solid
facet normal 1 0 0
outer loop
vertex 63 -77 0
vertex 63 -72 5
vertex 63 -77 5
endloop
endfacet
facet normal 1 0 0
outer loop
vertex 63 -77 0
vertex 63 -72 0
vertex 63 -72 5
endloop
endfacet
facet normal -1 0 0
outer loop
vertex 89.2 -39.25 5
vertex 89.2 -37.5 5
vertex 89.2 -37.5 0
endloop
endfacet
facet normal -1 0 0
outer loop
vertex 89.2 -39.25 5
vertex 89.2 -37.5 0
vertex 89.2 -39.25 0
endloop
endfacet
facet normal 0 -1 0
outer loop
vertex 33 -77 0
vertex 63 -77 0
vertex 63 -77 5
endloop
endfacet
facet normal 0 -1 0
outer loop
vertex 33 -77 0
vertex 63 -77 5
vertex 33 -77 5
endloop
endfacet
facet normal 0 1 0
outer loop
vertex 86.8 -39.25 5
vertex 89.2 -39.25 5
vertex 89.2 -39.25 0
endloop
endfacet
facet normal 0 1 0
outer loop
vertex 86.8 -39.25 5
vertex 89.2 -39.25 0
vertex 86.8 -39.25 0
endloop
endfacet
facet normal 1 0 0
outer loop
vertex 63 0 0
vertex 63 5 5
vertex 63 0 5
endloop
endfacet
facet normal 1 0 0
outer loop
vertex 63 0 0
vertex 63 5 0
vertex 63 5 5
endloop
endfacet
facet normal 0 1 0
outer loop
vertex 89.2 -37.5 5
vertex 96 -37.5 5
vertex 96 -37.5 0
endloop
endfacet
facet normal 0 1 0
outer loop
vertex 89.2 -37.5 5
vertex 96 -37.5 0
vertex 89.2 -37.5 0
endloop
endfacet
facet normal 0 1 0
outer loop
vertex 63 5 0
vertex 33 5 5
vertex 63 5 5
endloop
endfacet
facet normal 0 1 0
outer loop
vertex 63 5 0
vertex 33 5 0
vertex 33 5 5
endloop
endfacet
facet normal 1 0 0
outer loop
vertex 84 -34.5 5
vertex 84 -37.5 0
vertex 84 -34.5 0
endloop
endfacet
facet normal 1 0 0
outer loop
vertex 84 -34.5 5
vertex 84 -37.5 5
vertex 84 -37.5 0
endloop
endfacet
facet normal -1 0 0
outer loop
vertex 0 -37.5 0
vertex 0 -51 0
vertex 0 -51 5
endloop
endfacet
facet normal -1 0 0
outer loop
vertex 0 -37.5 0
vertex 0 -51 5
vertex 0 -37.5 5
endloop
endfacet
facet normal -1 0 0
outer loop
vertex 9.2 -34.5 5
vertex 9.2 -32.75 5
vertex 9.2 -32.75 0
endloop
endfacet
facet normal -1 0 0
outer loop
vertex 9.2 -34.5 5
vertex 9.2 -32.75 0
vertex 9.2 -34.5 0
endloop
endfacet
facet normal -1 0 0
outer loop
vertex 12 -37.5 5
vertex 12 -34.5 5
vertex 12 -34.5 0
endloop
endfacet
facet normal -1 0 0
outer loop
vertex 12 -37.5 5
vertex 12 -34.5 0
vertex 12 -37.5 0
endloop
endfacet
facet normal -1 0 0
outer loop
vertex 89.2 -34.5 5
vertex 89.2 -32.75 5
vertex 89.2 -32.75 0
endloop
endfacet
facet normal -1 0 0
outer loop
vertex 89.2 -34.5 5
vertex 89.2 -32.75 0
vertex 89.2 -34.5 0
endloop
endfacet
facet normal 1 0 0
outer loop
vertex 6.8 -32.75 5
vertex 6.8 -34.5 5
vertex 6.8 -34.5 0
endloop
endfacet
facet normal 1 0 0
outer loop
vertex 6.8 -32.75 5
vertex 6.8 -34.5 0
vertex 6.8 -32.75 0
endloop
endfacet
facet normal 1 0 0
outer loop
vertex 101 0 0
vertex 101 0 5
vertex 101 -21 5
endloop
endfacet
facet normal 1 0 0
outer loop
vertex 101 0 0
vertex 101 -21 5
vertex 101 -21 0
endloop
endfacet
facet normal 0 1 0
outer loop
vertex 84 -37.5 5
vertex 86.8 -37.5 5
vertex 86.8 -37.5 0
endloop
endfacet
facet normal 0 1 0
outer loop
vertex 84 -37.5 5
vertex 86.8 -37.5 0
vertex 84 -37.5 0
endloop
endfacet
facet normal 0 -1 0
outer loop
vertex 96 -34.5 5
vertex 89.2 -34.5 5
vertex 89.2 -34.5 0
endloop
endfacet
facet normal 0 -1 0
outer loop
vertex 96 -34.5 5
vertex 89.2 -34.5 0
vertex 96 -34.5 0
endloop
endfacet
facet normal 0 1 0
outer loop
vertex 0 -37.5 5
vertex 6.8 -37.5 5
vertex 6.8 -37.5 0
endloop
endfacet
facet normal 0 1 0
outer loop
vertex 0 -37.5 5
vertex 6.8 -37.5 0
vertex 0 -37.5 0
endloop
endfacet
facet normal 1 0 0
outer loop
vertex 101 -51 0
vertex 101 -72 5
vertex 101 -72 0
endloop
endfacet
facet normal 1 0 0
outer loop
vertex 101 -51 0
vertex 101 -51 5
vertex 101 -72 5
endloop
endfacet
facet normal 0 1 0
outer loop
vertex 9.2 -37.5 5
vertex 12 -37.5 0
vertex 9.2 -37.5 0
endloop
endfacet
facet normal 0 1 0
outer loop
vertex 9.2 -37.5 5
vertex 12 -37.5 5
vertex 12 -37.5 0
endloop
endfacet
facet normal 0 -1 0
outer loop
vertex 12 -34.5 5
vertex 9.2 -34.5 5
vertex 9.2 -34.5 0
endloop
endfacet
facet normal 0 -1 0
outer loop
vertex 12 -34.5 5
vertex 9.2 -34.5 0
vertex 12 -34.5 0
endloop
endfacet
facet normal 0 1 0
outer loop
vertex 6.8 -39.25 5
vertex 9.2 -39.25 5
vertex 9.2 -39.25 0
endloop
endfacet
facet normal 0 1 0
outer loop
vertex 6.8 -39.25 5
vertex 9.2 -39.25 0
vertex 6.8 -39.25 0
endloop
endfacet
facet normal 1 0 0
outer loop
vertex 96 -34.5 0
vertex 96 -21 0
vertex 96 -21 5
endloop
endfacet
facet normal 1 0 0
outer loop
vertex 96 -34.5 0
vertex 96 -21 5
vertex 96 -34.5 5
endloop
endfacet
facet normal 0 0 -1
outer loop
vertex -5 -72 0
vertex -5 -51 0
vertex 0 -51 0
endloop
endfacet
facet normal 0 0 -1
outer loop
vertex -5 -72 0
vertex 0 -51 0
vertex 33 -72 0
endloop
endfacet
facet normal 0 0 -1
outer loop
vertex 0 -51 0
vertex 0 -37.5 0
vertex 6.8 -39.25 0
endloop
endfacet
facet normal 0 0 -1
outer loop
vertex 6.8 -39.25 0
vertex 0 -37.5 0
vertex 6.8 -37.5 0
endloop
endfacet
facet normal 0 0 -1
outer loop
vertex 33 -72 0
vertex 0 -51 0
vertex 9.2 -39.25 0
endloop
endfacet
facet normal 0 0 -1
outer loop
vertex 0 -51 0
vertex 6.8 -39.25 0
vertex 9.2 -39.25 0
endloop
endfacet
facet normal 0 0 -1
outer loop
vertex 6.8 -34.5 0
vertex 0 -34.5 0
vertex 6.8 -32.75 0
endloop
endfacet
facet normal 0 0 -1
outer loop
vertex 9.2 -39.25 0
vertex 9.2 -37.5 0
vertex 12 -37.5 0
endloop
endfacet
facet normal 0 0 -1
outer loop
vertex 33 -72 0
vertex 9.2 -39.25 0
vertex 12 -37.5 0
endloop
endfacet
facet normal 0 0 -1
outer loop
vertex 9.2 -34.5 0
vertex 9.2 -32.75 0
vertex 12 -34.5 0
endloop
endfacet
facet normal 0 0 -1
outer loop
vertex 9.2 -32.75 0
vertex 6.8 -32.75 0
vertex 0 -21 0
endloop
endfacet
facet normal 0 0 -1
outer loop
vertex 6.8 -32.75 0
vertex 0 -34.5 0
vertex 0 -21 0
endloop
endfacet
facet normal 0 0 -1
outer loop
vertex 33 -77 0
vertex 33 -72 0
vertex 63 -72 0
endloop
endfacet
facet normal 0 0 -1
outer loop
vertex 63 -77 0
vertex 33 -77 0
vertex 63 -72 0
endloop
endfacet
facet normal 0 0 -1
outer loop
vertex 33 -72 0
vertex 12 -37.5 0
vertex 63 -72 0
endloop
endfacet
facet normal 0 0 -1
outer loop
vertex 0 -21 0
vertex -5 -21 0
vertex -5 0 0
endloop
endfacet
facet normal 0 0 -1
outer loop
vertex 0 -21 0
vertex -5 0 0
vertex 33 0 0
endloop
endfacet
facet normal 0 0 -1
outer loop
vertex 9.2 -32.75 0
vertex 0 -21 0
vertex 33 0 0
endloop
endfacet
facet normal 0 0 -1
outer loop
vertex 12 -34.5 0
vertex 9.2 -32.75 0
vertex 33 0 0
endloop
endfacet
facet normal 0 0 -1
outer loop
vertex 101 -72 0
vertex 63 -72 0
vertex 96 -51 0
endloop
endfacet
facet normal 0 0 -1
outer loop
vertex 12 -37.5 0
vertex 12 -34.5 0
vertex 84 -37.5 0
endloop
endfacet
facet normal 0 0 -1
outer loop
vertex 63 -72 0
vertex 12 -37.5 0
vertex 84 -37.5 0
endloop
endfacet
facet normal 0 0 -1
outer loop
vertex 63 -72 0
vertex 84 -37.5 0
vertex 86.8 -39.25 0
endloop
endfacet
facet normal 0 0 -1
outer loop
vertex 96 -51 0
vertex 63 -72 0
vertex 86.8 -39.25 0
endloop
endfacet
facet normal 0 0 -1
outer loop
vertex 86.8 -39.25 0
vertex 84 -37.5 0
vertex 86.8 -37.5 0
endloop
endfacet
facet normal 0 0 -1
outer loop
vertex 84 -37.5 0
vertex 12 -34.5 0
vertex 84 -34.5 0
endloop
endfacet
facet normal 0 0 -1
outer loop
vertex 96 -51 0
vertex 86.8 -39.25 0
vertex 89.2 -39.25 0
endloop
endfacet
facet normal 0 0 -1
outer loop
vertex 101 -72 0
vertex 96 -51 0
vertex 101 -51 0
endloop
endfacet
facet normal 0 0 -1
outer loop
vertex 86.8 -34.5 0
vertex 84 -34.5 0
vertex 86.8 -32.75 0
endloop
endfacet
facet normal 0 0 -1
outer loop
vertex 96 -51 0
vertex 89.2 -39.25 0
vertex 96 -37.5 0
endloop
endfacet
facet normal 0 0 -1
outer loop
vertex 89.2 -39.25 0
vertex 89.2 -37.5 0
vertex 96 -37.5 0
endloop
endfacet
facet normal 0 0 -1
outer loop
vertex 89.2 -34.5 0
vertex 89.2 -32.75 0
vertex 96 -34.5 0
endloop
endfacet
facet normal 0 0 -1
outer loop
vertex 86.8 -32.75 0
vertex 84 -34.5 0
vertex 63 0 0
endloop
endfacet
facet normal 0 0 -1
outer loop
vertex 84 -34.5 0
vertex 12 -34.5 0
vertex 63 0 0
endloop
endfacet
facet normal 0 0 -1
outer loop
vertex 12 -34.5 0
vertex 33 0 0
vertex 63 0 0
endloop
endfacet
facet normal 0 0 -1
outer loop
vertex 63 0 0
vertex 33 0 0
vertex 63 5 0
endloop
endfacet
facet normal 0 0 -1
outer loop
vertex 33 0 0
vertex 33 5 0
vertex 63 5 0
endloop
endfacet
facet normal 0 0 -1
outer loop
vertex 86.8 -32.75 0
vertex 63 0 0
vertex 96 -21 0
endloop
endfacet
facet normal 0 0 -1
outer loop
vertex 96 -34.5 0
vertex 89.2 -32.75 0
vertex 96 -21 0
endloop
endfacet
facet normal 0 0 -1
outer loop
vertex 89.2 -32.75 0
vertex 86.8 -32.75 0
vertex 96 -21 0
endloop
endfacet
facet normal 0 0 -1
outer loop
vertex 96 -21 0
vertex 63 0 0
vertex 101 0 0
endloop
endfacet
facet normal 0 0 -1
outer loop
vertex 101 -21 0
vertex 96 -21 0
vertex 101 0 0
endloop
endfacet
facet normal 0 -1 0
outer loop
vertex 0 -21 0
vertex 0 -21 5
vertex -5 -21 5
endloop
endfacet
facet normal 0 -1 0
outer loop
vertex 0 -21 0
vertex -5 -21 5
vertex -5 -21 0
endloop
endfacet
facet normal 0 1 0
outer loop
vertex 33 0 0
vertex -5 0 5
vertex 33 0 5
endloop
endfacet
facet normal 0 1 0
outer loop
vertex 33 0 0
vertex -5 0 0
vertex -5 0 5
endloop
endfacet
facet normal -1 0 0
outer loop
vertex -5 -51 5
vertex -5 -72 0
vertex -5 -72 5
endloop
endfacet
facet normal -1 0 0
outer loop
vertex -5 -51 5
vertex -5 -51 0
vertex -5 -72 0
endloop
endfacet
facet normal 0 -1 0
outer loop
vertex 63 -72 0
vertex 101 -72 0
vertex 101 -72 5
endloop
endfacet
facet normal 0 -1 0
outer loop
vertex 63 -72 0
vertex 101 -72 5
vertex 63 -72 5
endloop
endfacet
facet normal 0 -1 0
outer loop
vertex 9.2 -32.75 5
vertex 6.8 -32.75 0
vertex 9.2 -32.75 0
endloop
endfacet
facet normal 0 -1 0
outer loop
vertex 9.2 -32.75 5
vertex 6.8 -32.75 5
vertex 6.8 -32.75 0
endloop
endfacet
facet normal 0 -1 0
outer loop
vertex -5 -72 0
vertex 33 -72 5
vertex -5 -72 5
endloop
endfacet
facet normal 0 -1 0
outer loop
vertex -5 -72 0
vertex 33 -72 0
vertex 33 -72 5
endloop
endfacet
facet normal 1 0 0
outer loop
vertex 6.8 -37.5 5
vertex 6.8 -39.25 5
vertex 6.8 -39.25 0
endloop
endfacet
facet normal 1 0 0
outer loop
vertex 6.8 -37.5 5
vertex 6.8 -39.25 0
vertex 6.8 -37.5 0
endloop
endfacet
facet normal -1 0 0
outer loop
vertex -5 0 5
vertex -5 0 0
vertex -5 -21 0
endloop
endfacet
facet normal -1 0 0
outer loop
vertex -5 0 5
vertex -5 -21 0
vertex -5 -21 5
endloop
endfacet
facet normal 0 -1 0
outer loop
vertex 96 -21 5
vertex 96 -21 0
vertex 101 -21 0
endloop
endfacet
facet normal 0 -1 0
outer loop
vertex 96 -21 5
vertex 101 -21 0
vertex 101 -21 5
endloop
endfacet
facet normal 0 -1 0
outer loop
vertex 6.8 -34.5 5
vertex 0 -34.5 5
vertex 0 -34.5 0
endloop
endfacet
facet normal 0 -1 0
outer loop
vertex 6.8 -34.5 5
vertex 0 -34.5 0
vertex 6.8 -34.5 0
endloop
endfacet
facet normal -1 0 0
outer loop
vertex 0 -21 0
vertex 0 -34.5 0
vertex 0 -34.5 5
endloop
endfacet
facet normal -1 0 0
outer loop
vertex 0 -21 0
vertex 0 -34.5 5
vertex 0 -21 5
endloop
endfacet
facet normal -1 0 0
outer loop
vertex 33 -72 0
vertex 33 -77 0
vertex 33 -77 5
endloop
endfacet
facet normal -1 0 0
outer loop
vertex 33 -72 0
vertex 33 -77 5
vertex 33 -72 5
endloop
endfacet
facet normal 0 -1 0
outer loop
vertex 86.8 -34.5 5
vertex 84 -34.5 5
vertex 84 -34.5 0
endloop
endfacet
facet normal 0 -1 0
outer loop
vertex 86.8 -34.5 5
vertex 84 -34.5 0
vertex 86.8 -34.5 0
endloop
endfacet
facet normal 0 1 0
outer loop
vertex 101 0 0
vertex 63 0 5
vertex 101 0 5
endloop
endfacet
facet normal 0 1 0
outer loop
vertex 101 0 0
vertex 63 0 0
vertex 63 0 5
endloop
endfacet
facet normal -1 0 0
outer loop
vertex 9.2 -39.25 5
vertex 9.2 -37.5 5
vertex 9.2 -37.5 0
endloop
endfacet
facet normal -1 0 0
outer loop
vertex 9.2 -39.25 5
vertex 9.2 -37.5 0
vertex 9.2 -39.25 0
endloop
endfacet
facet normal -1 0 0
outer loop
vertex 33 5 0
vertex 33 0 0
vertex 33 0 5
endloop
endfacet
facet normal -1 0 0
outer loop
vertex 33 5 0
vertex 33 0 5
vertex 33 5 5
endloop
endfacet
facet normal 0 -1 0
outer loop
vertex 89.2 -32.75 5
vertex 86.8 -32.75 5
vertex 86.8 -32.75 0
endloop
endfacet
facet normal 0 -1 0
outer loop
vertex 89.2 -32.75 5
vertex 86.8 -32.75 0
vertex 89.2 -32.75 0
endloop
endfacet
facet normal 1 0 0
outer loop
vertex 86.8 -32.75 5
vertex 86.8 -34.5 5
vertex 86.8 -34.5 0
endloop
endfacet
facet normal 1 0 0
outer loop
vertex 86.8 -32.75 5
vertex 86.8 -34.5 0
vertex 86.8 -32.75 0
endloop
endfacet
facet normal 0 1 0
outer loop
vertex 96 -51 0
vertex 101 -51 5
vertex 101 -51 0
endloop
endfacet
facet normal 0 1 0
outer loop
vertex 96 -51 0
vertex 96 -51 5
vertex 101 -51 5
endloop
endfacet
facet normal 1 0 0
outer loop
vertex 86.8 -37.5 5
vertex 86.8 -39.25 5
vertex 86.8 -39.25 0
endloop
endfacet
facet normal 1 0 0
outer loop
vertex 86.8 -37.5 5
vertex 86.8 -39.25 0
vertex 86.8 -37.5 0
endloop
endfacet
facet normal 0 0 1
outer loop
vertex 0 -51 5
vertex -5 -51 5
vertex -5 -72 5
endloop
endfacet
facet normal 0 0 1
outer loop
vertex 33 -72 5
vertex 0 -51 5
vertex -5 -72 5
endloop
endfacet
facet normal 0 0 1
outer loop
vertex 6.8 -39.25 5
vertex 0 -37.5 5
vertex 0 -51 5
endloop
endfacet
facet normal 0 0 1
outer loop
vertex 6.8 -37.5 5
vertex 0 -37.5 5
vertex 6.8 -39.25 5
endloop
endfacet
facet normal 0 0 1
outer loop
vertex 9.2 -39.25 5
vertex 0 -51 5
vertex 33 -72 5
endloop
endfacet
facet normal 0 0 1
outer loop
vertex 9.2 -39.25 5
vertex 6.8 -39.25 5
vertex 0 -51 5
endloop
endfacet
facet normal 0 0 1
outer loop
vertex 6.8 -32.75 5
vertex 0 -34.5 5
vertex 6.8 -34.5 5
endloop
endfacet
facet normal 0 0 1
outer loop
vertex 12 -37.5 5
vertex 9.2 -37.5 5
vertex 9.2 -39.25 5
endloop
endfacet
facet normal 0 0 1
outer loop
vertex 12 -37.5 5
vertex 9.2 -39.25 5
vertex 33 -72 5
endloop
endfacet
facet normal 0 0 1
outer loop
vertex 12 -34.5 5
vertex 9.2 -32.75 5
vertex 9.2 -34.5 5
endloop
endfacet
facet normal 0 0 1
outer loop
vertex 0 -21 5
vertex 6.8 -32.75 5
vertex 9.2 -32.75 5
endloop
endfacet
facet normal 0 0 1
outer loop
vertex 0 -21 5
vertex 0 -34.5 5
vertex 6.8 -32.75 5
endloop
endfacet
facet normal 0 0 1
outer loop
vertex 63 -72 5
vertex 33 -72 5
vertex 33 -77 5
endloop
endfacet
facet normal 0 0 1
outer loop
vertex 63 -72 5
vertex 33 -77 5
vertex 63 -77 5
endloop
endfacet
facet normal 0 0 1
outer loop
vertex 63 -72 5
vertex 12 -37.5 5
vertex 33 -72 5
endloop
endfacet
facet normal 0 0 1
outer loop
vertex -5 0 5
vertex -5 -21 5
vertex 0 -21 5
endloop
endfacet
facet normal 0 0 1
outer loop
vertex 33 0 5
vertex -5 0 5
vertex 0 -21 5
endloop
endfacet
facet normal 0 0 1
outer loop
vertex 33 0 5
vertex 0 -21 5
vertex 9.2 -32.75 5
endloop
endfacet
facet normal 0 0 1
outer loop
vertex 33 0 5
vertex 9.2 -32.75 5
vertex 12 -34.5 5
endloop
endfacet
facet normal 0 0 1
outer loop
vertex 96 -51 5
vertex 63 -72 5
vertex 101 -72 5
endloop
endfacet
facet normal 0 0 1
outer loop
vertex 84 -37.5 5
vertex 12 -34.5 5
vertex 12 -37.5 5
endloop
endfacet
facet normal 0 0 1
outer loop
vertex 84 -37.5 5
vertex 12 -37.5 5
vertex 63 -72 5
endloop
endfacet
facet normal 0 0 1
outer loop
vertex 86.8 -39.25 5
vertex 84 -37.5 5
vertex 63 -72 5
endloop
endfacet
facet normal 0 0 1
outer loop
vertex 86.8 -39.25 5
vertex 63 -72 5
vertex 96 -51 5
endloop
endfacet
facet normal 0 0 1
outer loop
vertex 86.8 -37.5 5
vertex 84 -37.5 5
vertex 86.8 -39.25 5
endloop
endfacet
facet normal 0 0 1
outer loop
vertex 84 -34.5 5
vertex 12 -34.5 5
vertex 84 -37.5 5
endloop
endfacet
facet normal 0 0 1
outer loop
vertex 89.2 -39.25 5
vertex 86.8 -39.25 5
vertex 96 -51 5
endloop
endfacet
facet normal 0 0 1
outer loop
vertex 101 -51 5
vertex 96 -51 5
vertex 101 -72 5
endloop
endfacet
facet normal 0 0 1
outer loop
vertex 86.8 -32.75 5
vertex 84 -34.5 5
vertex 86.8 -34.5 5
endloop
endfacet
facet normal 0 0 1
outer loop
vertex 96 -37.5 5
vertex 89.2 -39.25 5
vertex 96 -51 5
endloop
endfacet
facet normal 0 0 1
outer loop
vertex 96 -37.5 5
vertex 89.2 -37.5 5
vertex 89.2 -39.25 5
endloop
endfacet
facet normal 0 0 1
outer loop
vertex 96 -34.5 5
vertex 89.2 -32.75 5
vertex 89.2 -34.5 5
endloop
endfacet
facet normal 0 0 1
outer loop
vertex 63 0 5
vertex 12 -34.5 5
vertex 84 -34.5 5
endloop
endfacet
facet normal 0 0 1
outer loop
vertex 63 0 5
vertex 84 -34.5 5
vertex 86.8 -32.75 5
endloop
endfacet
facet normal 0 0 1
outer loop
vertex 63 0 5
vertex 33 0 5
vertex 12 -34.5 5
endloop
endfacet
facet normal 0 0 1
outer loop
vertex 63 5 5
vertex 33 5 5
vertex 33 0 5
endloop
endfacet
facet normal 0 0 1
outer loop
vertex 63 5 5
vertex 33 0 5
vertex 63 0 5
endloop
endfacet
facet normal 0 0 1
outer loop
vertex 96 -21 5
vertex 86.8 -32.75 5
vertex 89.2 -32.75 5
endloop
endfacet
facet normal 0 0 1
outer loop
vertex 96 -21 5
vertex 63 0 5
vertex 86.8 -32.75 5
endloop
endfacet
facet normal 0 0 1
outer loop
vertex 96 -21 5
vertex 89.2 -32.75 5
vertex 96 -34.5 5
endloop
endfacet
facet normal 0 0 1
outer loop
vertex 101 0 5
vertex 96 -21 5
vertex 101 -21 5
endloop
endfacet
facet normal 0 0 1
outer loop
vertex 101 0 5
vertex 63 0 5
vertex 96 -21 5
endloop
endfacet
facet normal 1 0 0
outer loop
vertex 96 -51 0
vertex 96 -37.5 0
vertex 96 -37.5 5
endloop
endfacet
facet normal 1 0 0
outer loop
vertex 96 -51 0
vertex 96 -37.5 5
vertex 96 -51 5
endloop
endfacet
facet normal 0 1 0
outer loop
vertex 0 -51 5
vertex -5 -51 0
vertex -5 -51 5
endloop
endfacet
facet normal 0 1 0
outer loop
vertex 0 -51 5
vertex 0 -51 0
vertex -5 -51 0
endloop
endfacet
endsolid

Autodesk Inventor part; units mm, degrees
ref_plane "YZ Plane" through (0, 0, 0) normal (1, 0, 0) x (0, 1, 0)
sketch "slot" plane through (0, 0, 0) normal (0, 0, 1) x (1, 0, 0)
  line L0 (-18.25, 14.2) -> (-11.75, 11.8) construction
  line L1 (-11.75, 14.2) -> (-18.25, 11.8) construction
  line L2 (-18.25, 14.2) -> (-16.5, 14.2)
  line L3 (-13.5, 14.2) -> (-11.75, 14.2)
  line L4 (-16.5, 9) -> (-16.5, 11.8)
  line L5 (-16.5, 14.2) -> (-16.5, 21)
  line L6 (-13.5, 21) -> (-13.5, 14.2)
  line L7 (-13.5, 11.8) -> (-13.5, 9)
  line L8 (-11.75, 11.8) -> (-13.5, 11.8)
  line L9 (-16.5, 11.8) -> (-18.25, 11.8)
  line L10 (-16.5, 21) -> (-13.5, 21)
  line L11 (-13.5, 9) -> (-16.5, 9)
  line L12 (-11.75, 14.2) -> (-11.75, 11.8)
  line L13 (-18.25, 11.8) -> (-18.25, 14.2)
  point P0 (-15, 21)
  point P1 (-15, 13)
  dimension "d8" = 3
  dimension "d9" = 12
  dimension "d10" = 6.5
  dimension "d11" = 2.4
  dimension "d12" = 8
ref_plane "工作平面1" through (0, 0, 0) normal (0, 0, 1) x (1, 0, 0)
sketch "草图2" plane through (0, 0, 0) normal (0, 0, 1) x (1, 0, 0)
  line L0 (74, -10) -> (74, -69) projected
  line L1 (74, -69) -> (69, -69) projected
  line L2 (69, -69) -> (69, -10) projected
  line L3 (69, -10) -> (74, -10) projected
  circle A0 centre (48, 2.5) radius 1.5 projected
  circle A1 centre (48, -74.5) radius 1.5 projected
  line L4 (33, -77) -> (33, -72) projected
  line L5 (63, -77) -> (33, -77) projected
  line L6 (63, -72) -> (63, -77) projected
  line L7 (96, -72) -> (63, -72) projected
  line L8 (96, 0) -> (96, -72) projected
  line L9 (63, 0) -> (96, 0) projected
  line L10 (63, 5) -> (63, 0) projected
  line L11 (33, 5) -> (63, 5) projected
  line L12 (33, 0) -> (33, 5) projected
  line L13 (0, 0) -> (33, 0) projected
  line L14 (0, -72) -> (0, 0) projected
  line L15 (33, -72) -> (0, -72) projected
extrude "拉伸2" add sketch "草图2" along normal blind 5 contours L0 L1 L2 L3 | A0 | A1 | L4 L15 L14 L13 L12 L11 L10 L9 L8 L7 L6 L5
sketch "草图3" plane through (0, -72, 0) normal (-1, 0, 0) x (0, 0, 1)
  line L0 (0, 0) -> (0, 72) projected
  line L1 (0, 0) -> (5, 0) projected
  line L2 (5, 72) -> (5, 0) projected
  line L3 (0, 72) -> (5, 72) projected
  circle A0 centre (2.5, 36) radius 1.5 projected
  circle A1 centre (-35, -2.5) radius 1.5 projected
  circle A2 centre (-85, -2.5) radius 1.5 projected
  circle A3 centre (-85, 74.5) radius 1.5 projected
  circle A4 centre (-35, 74.5) radius 1.5 projected
  line L4 (-20, 0) -> (-20, -5) projected
  line L5 (0, 0) -> (-20, 0) projected
  line L6 (0, 21) -> (0, 0) projected
  line L7 (0, 21) -> (5, 21) projected
  line L8 (5, 21) -> (5, 51) projected
  line L9 (5, 51) -> (0, 51) projected
  line L10 (0, 72) -> (0, 51) projected
  line L11 (-20, 72) -> (0, 72) projected
  line L12 (-20, 77) -> (-20, 72) projected
  line L13 (-50, 77) -> (-20, 77) projected
  line L14 (-50, 72) -> (-50, 77) projected
  line L15 (-70, 72) -> (-50, 72) projected
  line L16 (-70, 77) -> (-70, 72) projected
  line L17 (-100, 77) -> (-70, 77) projected
  line L18 (-100, 72) -> (-100, 77) projected
  line L19 (-121, 72) -> (-100, 72) projected
  line L20 (-121, 0) -> (-121, 72) projected
  line L21 (-100, 0) -> (-121, 0) projected
  line L22 (-100, -5) -> (-100, 0) projected
  line L23 (-70, -5) -> (-100, -5) projected
  line L24 (-70, 0) -> (-70, -5) projected
  line L25 (-50, 0) -> (-70, 0) projected
  line L26 (-50, -5) -> (-50, 0) projected
  line L27 (-20, -5) -> (-50, -5) projected
ref_plane "工作平面2" through (-5, -77, -121) normal (-1, 0, 0) x (0, 0, 1)
extrude "拉伸3" add sketch "草图3" along normal up to surface (5 mm away) contours L0 L7 L2 L1 | L0 L3 L2 L9
sketch "草图4" plane through (96, -72, 0) normal (1, 0, 0) x (0, 0, -1)
  line L0 (0, 72) -> (0, 0) projected
  line L1 (0, 72) -> (-5, 72) projected
  line L2 (-5, 0) -> (-5, 72) projected
  line L3 (0, 0) -> (-5, 0) projected
  circle A0 centre (-2.5, 36) radius 1.5 projected
  circle A1 centre (35, -2.5) radius 1.5 projected
  circle A2 centre (85, -2.5) radius 1.5 projected
  circle A3 centre (85, 74.5) radius 1.5 projected
  circle A4 centre (35, 74.5) radius 1.5 projected
  line L4 (20, 0) -> (20, -5) projected
  line L5 (20, -5) -> (50, -5) projected
  line L6 (50, -5) -> (50, 0) projected
  line L7 (50, 0) -> (70, 0) projected
  line L8 (70, 0) -> (70, -5) projected
  line L9 (70, -5) -> (100, -5) projected
  line L10 (100, -5) -> (100, 0) projected
  line L11 (100, 0) -> (121, 0) projected
  line L12 (121, 0) -> (121, 72) projected
  line L13 (121, 72) -> (100, 72) projected
  line L14 (100, 72) -> (100, 77) projected
  line L15 (100, 77) -> (70, 77) projected
  line L16 (70, 77) -> (70, 72) projected
  line L17 (70, 72) -> (50, 72) projected
  line L18 (50, 72) -> (50, 77) projected
  line L19 (50, 77) -> (20, 77) projected
  line L20 (20, 77) -> (20, 72) projected
  line L21 (20, 72) -> (0, 72) projected
  line L22 (0, 72) -> (0, 51) projected
  line L23 (0, 51) -> (-5, 51) projected
  line L24 (-5, 51) -> (-5, 21) projected
  line L25 (-5, 21) -> (0, 21) projected
  line L26 (0, 21) -> (0, 0) projected
  line L27 (0, 0) -> (20, 0) projected
ref_plane "工作平面3" through (101, -77, -121) normal (1, 0, 0) x (0, 1, 0)
extrude "拉伸4" add sketch "草图4" along normal up to surface (5 mm away) contours L0 L23 L2 L1 | L0 L3 L2 L25
sketch "草图5" plane through (0, 0, 5) normal (0, 0, 1) x (1, 0, 0)
  line L0 (0, -21) -> (0, -51) projected
  line L1 (96, -51) -> (96, -21) projected
  line L2 (-5, -37.5) -> (-5, -34.5) projected
  line L3 (101, -34.5) -> (101, -37.5) projected
  line L4 (6.8, -39.25) -> (9.2, -32.75) construction
  line L5 (6.8, -32.75) -> (9.2, -39.25) construction
  line L6 (6.8, -39.25) -> (6.8, -37.5)
  line L7 (6.8, -34.5) -> (6.8, -32.75)
  line L8 (12, -37.5) -> (9.2, -37.5)
  line L9 (6.8, -37.5) -> (0, -37.5)
  line L10 (0, -34.5) -> (6.8, -34.5)
  line L11 (9.2, -34.5) -> (12, -34.5)
  line L12 (9.2, -32.75) -> (9.2, -34.5)
  line L13 (9.2, -37.5) -> (9.2, -39.25)
  line L14 (0, -37.5) -> (0, -34.5)
  line L15 (12, -34.5) -> (12, -37.5)
  line L16 (6.8, -32.75) -> (9.2, -32.75)
  line L17 (9.2, -39.25) -> (6.8, -39.25)
  line L18 (89.2, -32.75) -> (86.8, -39.25) construction
  line L19 (89.2, -39.25) -> (86.8, -32.75) construction
  line L20 (89.2, -32.75) -> (89.2, -34.5)
  line L21 (89.2, -37.5) -> (89.2, -39.25)
  line L22 (84, -34.5) -> (86.8, -34.5)
  line L23 (89.2, -34.5) -> (96, -34.5)
  line L24 (96, -37.5) -> (89.2, -37.5)
  line L25 (86.8, -37.5) -> (84, -37.5)
  line L26 (86.8, -39.25) -> (86.8, -37.5)
  line L27 (86.8, -34.5) -> (86.8, -32.75)
  line L28 (96, -34.5) -> (96, -37.5)
  line L29 (84, -37.5) -> (84, -34.5)
  line L30 (89.2, -39.25) -> (86.8, -39.25)
  line L31 (86.8, -32.75) -> (89.2, -32.75)
  point P0 (0, 0)
extrude "拉伸5" cut sketch "草图5" against normal through all
properties part number "back"
